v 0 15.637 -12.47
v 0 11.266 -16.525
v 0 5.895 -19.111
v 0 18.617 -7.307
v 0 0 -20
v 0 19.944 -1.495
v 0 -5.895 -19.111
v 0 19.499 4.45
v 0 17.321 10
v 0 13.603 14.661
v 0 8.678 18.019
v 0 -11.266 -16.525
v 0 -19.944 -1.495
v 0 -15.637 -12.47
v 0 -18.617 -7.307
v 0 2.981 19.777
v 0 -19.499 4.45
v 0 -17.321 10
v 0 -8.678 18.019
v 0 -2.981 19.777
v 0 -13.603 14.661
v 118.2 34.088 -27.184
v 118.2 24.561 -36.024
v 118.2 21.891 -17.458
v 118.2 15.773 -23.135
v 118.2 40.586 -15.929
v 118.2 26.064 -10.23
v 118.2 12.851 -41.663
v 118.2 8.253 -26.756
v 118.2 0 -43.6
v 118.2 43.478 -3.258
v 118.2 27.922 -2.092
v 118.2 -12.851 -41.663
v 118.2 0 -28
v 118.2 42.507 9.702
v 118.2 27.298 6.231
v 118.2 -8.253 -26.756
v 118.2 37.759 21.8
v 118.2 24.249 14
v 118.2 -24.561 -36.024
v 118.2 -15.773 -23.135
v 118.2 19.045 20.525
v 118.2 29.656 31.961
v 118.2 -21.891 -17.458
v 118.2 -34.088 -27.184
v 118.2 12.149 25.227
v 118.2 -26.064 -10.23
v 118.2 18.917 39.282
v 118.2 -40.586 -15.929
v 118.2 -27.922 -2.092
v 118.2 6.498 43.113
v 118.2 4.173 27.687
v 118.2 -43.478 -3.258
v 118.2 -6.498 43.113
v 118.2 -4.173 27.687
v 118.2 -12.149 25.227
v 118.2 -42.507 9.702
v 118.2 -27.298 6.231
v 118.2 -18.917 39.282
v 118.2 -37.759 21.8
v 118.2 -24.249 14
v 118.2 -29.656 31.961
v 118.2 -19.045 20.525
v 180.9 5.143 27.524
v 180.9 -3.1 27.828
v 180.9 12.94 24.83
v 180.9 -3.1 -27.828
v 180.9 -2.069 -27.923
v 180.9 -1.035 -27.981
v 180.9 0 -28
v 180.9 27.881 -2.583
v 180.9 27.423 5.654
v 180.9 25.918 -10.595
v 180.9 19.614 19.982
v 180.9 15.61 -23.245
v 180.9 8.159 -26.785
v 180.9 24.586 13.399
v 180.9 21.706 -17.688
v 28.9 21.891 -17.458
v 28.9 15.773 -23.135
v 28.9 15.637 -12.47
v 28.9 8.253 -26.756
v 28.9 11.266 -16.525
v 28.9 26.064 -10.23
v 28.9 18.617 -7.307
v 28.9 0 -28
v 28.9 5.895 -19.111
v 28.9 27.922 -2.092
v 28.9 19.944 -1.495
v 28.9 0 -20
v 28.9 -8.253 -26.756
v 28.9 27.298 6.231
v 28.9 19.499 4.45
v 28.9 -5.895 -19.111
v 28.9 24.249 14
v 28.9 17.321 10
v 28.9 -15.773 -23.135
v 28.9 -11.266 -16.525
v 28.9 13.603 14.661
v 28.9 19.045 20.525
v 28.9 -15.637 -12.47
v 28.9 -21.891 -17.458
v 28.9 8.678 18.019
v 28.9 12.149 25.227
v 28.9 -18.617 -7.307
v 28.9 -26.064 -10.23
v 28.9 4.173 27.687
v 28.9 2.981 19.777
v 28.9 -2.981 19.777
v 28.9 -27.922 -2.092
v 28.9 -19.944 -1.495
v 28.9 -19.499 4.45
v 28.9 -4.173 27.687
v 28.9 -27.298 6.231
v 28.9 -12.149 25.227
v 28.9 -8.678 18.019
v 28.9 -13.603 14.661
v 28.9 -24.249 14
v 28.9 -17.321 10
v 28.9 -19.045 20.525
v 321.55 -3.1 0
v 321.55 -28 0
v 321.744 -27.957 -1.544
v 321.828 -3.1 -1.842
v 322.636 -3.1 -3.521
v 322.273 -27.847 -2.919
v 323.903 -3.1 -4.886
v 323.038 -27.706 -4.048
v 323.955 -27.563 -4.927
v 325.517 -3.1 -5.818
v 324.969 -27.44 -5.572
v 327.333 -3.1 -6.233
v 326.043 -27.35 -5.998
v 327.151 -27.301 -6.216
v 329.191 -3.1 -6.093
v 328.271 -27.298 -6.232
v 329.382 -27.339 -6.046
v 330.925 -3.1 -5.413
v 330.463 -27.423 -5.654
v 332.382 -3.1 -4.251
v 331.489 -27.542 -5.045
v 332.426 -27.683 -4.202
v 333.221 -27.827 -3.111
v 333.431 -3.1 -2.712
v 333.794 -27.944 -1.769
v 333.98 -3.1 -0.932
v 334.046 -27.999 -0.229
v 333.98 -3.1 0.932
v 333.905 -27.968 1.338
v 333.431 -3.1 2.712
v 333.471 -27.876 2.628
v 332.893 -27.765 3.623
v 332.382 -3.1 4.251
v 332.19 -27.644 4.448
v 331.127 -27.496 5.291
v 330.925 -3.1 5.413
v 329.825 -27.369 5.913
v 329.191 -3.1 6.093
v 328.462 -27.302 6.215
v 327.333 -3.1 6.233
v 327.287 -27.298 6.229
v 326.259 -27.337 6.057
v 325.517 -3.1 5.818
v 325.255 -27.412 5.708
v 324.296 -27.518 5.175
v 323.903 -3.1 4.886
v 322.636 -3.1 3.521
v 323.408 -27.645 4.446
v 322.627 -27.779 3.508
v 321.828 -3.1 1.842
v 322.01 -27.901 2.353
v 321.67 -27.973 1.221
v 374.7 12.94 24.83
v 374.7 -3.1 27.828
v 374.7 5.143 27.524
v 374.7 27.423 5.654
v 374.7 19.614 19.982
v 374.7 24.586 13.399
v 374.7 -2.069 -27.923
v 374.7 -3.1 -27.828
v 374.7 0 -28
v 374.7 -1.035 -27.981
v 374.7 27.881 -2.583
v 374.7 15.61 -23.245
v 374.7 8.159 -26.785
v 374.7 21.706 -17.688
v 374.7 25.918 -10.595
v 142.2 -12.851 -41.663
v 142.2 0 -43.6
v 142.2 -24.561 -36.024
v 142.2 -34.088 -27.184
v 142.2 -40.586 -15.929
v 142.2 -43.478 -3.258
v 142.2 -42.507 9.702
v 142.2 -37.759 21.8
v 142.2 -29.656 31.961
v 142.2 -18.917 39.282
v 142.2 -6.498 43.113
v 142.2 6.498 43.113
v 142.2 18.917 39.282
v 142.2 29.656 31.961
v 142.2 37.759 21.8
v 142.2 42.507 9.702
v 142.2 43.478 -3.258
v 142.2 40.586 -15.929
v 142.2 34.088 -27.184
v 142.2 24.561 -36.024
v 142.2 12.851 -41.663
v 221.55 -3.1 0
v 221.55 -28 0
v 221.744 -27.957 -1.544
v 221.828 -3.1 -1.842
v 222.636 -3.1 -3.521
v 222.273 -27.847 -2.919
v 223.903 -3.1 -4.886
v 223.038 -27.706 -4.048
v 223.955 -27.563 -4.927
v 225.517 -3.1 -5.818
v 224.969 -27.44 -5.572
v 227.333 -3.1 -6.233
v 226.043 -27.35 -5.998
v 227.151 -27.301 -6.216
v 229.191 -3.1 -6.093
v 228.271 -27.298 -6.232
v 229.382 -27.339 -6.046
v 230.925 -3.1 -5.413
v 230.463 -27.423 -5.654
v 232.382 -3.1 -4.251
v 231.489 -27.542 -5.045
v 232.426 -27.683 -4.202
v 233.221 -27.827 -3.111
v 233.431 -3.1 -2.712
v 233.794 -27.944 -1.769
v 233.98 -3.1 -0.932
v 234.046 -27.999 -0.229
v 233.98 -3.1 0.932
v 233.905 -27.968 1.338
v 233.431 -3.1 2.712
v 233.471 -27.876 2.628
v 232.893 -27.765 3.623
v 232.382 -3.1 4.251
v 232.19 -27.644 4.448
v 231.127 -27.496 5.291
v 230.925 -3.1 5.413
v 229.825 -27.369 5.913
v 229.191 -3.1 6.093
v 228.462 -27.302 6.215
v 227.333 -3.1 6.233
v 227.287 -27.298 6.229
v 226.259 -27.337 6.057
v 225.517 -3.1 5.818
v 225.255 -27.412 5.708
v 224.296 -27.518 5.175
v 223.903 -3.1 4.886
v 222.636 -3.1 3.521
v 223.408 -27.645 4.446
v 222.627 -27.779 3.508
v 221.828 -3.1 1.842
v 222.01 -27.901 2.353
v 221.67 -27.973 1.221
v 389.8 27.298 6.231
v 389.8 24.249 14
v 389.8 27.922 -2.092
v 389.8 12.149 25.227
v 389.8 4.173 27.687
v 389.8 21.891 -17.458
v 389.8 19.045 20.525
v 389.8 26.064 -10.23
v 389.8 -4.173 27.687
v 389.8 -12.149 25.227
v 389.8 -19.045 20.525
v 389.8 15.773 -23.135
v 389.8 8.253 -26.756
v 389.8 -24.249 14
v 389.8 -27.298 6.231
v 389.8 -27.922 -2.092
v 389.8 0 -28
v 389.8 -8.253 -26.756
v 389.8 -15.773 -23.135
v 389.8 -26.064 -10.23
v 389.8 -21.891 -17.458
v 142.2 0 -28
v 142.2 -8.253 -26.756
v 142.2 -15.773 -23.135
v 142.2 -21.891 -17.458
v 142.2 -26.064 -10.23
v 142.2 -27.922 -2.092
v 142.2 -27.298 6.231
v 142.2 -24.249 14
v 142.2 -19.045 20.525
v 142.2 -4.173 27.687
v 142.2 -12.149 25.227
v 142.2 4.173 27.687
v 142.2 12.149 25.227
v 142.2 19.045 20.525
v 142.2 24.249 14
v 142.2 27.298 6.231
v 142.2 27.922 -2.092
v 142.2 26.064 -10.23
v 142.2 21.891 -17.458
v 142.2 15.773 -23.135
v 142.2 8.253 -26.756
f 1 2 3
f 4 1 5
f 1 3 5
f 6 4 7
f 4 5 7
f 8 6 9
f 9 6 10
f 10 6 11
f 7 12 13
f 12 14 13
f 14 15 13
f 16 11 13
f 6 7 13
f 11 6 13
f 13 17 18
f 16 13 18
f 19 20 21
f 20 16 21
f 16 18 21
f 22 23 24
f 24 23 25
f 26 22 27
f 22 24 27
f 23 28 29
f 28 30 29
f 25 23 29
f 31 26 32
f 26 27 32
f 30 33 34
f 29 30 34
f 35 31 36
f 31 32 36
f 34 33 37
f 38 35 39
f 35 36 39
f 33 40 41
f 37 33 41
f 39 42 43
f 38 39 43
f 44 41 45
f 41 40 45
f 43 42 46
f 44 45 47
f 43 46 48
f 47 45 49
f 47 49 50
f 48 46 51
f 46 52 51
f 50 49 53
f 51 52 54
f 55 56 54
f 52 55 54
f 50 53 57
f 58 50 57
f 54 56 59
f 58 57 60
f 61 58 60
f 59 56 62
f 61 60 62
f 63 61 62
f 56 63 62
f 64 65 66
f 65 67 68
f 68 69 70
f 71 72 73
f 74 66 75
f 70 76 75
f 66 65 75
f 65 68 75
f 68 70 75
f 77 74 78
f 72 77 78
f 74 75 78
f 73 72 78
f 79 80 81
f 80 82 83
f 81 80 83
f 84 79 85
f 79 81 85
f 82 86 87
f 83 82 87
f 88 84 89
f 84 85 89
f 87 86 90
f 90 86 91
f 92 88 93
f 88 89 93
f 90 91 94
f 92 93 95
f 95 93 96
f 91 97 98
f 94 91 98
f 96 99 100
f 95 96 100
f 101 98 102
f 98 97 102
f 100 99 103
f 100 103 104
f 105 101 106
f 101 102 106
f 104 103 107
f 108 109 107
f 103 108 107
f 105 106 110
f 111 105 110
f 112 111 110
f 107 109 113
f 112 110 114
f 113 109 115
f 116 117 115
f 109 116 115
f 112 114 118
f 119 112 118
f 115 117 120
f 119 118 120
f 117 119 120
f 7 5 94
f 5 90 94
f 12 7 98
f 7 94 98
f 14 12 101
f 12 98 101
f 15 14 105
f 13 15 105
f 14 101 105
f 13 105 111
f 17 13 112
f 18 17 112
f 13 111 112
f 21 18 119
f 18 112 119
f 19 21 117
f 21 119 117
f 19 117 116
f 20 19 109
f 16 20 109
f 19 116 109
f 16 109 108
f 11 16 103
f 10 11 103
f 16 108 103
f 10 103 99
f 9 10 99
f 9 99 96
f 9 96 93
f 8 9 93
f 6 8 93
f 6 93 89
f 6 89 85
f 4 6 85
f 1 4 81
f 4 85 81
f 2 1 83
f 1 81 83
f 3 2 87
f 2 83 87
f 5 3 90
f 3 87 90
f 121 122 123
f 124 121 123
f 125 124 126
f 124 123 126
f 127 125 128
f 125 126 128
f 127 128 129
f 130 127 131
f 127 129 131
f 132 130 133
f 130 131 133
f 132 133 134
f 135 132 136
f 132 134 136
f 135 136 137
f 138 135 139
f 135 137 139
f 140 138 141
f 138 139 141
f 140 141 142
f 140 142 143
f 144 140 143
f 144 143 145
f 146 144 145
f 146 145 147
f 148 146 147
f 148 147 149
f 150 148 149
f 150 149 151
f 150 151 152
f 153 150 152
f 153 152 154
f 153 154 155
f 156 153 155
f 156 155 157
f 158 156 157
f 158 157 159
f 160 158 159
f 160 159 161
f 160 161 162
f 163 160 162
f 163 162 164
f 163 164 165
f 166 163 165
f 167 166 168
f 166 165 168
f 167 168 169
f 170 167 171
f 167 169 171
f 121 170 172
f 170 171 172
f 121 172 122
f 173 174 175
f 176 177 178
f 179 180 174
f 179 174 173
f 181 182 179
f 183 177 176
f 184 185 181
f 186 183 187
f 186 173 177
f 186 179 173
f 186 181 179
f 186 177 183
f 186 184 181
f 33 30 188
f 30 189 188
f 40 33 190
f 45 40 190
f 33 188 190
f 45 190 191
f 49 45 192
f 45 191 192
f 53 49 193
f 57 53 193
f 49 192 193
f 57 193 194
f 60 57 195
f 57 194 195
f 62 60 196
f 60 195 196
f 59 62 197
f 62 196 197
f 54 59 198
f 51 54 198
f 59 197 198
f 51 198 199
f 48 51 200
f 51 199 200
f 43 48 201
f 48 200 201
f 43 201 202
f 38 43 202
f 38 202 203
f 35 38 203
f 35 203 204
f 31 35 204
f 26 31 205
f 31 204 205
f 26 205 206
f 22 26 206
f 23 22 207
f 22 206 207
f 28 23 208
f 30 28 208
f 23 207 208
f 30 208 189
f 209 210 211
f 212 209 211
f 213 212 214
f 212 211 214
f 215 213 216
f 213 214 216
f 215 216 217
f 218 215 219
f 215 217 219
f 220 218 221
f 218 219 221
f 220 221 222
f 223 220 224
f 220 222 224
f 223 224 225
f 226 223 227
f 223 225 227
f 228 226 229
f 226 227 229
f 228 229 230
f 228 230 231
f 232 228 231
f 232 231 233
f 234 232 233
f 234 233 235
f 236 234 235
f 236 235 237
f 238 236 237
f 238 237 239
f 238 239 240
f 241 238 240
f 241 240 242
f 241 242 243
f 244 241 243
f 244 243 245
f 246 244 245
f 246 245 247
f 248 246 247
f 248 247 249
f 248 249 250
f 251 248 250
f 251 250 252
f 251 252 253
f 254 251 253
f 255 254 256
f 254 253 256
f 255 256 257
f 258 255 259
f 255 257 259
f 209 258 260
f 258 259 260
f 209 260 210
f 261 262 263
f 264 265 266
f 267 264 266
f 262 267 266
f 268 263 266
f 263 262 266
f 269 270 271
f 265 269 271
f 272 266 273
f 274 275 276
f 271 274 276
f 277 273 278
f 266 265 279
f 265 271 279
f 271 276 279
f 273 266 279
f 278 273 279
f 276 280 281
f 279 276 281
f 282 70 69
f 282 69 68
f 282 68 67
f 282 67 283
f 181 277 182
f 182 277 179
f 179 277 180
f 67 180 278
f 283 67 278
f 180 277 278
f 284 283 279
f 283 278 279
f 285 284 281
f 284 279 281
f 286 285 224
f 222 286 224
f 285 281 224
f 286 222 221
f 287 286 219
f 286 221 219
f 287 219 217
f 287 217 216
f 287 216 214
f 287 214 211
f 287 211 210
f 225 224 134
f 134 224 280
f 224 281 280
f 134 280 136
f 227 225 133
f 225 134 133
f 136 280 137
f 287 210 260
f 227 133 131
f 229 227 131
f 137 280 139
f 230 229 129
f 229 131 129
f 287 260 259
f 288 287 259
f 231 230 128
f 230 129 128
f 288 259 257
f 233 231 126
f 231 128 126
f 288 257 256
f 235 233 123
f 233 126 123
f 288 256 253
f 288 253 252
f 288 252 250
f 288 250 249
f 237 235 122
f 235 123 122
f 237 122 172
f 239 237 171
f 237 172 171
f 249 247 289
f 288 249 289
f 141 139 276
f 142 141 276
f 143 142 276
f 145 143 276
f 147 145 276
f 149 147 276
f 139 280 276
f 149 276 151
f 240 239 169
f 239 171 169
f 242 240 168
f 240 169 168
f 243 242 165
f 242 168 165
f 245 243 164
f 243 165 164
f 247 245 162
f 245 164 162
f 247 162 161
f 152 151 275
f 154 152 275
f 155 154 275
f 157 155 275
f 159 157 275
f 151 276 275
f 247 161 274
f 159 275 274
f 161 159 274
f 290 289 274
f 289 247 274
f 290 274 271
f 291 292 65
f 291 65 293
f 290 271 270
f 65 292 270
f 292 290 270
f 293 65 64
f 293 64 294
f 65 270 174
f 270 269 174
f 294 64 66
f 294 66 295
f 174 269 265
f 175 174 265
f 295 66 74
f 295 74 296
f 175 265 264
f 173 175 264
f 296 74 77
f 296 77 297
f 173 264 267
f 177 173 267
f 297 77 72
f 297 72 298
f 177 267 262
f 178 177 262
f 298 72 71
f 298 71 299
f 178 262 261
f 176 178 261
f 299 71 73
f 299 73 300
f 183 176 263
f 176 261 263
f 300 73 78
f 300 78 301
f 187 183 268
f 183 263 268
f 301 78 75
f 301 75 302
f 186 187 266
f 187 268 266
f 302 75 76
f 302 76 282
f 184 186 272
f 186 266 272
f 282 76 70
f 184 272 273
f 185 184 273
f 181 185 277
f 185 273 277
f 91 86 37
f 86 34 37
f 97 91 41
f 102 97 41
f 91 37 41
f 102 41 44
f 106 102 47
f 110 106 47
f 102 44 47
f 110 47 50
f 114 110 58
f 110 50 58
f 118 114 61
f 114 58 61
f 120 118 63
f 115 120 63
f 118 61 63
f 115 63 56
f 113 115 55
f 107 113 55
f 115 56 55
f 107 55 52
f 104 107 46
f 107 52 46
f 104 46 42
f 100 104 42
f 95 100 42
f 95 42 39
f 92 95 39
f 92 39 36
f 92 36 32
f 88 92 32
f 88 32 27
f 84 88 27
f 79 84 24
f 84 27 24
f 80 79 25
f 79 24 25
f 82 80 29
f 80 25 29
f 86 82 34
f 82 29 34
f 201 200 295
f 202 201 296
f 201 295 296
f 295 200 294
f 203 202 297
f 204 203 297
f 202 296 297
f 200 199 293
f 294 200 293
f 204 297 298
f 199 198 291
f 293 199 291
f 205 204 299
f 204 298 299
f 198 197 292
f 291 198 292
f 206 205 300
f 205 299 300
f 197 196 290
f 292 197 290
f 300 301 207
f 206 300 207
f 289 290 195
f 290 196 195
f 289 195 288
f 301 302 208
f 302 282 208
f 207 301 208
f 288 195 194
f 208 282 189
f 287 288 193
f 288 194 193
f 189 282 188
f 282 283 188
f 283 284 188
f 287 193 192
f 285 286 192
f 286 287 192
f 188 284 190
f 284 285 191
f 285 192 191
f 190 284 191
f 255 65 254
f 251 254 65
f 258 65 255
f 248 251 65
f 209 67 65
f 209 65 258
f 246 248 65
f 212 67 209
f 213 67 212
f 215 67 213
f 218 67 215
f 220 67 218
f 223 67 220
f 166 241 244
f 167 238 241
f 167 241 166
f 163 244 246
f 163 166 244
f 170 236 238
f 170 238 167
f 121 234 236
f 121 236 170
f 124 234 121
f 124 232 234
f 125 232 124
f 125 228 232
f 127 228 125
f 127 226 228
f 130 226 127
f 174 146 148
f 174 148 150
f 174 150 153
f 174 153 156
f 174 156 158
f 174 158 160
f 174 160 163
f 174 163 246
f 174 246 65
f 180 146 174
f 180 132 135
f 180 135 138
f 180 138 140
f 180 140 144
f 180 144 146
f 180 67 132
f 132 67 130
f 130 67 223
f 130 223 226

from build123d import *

# Parameters (mm, degrees)
CUT_EXTRUDE1_DEPTH      = 395.646626743
CUT_EXTRUDE1_DEPTH_BACK = 395.646626743
SKETCH2_W               = 193.8
SKETCH2_H               = 31.1
HOLE1_D                 = 12.5


with BuildPart() as part:
    # Sketch1 → Revolve1 (revolve)
    with BuildSketch(Plane.XY, mode=Mode.PRIVATE) as revolve1_sk:
        Polygon((0, 0), (0, 20), (28.9, 20), (28.9, 28), (118.2, 28), (118.2, 43.6), (142.2, 43.6), (142.2, 28), (389.8, 28), (389.8, 0), align=None)
    revolve(revolve1_sk.sketch.rotate(Axis((389.8, 0, 0), (-1, 0, 0)), 90), axis=Axis((389.8, 0, 0), (-1, 0, 0)))

    # Sketch2 → Cut-Extrude1 (cut, two sides: drawn at the far end of the back side and taken through both)
    with BuildSketch(Plane.XY.offset(-CUT_EXTRUDE1_DEPTH_BACK)):
        with Locations((277.8, 12.45)):
            Rectangle(SKETCH2_W, SKETCH2_H)
    extrude(amount=CUT_EXTRUDE1_DEPTH + CUT_EXTRUDE1_DEPTH_BACK, mode=Mode.SUBTRACT)

    # Hole1 (through all)
    with Locations(Plane(origin=(0, -3.1, 0), x_dir=(1, 0, 0), z_dir=(0, 1, 0))):
        with Locations((227.8, 0), (327.8, 0)):
            Hole(HOLE1_D / 2)


solid = part.part
